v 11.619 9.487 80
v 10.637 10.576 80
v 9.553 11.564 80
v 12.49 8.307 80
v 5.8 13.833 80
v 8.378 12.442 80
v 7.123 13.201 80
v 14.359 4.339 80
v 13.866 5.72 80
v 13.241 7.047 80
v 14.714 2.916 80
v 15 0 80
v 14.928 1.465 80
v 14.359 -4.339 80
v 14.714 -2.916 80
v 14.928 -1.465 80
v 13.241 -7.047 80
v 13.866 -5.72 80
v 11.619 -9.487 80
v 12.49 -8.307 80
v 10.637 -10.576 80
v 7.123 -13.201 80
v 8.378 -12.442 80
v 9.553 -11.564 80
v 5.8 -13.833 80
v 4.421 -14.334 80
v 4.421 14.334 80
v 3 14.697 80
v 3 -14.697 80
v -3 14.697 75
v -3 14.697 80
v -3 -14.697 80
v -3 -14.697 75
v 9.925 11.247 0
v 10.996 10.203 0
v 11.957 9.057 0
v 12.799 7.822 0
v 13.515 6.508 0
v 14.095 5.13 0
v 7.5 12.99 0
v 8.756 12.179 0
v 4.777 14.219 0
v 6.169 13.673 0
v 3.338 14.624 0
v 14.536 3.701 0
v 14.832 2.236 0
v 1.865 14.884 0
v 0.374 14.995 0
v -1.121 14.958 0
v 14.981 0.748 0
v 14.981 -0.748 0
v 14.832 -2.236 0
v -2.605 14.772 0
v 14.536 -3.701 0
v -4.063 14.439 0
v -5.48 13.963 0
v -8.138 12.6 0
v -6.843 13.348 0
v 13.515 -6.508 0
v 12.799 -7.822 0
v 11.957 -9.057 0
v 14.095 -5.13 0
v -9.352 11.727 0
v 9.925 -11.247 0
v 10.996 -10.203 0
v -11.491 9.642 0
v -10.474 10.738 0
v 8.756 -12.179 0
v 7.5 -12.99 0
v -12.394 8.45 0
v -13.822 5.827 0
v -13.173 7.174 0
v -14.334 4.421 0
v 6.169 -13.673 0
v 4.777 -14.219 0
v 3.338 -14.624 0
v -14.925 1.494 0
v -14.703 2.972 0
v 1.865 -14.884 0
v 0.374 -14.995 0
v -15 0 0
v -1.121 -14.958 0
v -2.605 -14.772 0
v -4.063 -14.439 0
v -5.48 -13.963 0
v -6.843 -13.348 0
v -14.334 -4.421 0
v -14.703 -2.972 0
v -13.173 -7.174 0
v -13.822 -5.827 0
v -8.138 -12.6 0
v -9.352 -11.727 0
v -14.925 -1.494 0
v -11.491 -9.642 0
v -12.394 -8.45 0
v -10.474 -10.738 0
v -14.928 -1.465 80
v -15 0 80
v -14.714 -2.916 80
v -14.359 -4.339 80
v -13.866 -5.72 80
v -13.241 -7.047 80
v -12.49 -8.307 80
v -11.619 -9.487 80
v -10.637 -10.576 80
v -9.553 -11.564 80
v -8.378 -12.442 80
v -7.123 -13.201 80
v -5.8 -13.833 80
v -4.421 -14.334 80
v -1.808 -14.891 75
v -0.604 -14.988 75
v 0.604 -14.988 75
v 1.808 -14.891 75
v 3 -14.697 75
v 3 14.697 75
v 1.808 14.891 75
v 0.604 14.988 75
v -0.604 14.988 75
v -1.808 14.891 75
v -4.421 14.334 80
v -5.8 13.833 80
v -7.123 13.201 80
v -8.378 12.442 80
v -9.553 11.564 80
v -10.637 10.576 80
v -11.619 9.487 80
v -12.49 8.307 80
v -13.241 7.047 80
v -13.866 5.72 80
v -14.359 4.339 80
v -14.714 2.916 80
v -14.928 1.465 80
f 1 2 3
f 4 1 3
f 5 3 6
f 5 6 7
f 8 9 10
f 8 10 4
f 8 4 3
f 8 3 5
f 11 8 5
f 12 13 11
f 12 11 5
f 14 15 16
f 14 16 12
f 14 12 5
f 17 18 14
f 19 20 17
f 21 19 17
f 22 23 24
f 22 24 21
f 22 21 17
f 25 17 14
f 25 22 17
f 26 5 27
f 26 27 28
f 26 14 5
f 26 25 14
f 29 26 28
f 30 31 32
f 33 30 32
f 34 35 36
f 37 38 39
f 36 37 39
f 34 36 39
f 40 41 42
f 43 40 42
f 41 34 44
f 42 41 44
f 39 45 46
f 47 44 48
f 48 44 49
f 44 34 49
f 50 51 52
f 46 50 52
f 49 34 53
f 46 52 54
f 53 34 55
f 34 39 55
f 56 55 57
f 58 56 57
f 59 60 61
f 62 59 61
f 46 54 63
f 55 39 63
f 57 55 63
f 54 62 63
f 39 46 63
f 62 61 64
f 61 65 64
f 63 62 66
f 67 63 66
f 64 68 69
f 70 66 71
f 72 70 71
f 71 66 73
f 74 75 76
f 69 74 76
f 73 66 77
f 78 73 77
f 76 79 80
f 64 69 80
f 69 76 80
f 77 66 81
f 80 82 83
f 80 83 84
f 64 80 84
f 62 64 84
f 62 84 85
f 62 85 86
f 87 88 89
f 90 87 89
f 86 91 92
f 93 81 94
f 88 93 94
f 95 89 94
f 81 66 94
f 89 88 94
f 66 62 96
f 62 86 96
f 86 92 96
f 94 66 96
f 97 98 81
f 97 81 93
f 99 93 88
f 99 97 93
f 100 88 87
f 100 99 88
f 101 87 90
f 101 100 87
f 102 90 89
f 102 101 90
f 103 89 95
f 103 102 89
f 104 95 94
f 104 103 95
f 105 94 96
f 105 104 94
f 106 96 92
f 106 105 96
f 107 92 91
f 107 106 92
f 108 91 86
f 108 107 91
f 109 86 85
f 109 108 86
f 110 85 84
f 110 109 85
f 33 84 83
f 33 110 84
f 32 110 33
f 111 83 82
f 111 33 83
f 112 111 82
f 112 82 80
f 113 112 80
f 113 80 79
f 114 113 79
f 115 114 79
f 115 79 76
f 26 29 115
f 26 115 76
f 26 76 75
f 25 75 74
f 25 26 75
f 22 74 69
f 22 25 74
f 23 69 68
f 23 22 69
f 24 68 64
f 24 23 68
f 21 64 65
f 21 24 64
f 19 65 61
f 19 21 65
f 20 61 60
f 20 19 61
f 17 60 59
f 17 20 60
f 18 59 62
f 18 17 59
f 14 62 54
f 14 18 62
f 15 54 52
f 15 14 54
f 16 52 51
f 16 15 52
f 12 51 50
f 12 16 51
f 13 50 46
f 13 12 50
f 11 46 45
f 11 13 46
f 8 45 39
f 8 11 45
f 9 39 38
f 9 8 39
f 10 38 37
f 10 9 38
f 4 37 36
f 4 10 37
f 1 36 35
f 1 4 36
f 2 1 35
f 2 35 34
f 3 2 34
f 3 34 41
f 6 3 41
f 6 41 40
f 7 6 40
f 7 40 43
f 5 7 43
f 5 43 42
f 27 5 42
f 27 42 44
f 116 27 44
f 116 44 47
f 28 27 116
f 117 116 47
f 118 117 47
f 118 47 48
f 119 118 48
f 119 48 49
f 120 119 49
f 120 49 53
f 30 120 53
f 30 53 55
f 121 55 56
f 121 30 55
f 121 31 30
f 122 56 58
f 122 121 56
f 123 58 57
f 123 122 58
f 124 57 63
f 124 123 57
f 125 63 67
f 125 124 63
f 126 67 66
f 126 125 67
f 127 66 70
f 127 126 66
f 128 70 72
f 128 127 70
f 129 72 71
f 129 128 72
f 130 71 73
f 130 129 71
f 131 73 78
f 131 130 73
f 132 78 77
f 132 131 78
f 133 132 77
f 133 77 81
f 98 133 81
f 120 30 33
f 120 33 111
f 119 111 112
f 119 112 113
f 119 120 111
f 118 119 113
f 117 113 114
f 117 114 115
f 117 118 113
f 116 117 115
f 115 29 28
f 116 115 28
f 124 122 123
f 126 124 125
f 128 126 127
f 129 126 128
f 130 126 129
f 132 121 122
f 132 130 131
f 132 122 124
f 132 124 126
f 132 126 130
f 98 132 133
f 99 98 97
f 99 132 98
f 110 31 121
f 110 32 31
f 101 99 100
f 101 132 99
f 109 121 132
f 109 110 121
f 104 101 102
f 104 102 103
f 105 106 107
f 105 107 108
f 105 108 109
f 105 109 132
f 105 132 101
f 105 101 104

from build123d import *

# Parameters (mm, degrees)
F0_W     = 15
F0_H     = 80
F3_DEPTH = 5


with BuildPart() as f1:
    # F0 (on Front) → F1 (revolve)
    with BuildSketch(Plane.XZ):
        with Locations((-7.5, 40)):
            Rectangle(F0_W, F0_H)
    revolve(axis=Axis((0, 0, 40), (0, 0, 1)))

    # F2 (on face) → F3 (cut)
    with BuildSketch(Plane.XY.offset(80)):
        with BuildLine():
            ThreePointArc((3, 14.6969384567), (0, 15), (-3, 14.6969384567))
            Line((-3, 14.6969384567), (-3, -14.6969384567))
            ThreePointArc((-3, -14.6969384567), (0, -15), (3, -14.6969384567))
            Line((3, -14.6969384567), (3, 14.6969384567))
        make_face()
    extrude(amount=-F3_DEPTH, mode=Mode.SUBTRACT)


solid = f1.part
